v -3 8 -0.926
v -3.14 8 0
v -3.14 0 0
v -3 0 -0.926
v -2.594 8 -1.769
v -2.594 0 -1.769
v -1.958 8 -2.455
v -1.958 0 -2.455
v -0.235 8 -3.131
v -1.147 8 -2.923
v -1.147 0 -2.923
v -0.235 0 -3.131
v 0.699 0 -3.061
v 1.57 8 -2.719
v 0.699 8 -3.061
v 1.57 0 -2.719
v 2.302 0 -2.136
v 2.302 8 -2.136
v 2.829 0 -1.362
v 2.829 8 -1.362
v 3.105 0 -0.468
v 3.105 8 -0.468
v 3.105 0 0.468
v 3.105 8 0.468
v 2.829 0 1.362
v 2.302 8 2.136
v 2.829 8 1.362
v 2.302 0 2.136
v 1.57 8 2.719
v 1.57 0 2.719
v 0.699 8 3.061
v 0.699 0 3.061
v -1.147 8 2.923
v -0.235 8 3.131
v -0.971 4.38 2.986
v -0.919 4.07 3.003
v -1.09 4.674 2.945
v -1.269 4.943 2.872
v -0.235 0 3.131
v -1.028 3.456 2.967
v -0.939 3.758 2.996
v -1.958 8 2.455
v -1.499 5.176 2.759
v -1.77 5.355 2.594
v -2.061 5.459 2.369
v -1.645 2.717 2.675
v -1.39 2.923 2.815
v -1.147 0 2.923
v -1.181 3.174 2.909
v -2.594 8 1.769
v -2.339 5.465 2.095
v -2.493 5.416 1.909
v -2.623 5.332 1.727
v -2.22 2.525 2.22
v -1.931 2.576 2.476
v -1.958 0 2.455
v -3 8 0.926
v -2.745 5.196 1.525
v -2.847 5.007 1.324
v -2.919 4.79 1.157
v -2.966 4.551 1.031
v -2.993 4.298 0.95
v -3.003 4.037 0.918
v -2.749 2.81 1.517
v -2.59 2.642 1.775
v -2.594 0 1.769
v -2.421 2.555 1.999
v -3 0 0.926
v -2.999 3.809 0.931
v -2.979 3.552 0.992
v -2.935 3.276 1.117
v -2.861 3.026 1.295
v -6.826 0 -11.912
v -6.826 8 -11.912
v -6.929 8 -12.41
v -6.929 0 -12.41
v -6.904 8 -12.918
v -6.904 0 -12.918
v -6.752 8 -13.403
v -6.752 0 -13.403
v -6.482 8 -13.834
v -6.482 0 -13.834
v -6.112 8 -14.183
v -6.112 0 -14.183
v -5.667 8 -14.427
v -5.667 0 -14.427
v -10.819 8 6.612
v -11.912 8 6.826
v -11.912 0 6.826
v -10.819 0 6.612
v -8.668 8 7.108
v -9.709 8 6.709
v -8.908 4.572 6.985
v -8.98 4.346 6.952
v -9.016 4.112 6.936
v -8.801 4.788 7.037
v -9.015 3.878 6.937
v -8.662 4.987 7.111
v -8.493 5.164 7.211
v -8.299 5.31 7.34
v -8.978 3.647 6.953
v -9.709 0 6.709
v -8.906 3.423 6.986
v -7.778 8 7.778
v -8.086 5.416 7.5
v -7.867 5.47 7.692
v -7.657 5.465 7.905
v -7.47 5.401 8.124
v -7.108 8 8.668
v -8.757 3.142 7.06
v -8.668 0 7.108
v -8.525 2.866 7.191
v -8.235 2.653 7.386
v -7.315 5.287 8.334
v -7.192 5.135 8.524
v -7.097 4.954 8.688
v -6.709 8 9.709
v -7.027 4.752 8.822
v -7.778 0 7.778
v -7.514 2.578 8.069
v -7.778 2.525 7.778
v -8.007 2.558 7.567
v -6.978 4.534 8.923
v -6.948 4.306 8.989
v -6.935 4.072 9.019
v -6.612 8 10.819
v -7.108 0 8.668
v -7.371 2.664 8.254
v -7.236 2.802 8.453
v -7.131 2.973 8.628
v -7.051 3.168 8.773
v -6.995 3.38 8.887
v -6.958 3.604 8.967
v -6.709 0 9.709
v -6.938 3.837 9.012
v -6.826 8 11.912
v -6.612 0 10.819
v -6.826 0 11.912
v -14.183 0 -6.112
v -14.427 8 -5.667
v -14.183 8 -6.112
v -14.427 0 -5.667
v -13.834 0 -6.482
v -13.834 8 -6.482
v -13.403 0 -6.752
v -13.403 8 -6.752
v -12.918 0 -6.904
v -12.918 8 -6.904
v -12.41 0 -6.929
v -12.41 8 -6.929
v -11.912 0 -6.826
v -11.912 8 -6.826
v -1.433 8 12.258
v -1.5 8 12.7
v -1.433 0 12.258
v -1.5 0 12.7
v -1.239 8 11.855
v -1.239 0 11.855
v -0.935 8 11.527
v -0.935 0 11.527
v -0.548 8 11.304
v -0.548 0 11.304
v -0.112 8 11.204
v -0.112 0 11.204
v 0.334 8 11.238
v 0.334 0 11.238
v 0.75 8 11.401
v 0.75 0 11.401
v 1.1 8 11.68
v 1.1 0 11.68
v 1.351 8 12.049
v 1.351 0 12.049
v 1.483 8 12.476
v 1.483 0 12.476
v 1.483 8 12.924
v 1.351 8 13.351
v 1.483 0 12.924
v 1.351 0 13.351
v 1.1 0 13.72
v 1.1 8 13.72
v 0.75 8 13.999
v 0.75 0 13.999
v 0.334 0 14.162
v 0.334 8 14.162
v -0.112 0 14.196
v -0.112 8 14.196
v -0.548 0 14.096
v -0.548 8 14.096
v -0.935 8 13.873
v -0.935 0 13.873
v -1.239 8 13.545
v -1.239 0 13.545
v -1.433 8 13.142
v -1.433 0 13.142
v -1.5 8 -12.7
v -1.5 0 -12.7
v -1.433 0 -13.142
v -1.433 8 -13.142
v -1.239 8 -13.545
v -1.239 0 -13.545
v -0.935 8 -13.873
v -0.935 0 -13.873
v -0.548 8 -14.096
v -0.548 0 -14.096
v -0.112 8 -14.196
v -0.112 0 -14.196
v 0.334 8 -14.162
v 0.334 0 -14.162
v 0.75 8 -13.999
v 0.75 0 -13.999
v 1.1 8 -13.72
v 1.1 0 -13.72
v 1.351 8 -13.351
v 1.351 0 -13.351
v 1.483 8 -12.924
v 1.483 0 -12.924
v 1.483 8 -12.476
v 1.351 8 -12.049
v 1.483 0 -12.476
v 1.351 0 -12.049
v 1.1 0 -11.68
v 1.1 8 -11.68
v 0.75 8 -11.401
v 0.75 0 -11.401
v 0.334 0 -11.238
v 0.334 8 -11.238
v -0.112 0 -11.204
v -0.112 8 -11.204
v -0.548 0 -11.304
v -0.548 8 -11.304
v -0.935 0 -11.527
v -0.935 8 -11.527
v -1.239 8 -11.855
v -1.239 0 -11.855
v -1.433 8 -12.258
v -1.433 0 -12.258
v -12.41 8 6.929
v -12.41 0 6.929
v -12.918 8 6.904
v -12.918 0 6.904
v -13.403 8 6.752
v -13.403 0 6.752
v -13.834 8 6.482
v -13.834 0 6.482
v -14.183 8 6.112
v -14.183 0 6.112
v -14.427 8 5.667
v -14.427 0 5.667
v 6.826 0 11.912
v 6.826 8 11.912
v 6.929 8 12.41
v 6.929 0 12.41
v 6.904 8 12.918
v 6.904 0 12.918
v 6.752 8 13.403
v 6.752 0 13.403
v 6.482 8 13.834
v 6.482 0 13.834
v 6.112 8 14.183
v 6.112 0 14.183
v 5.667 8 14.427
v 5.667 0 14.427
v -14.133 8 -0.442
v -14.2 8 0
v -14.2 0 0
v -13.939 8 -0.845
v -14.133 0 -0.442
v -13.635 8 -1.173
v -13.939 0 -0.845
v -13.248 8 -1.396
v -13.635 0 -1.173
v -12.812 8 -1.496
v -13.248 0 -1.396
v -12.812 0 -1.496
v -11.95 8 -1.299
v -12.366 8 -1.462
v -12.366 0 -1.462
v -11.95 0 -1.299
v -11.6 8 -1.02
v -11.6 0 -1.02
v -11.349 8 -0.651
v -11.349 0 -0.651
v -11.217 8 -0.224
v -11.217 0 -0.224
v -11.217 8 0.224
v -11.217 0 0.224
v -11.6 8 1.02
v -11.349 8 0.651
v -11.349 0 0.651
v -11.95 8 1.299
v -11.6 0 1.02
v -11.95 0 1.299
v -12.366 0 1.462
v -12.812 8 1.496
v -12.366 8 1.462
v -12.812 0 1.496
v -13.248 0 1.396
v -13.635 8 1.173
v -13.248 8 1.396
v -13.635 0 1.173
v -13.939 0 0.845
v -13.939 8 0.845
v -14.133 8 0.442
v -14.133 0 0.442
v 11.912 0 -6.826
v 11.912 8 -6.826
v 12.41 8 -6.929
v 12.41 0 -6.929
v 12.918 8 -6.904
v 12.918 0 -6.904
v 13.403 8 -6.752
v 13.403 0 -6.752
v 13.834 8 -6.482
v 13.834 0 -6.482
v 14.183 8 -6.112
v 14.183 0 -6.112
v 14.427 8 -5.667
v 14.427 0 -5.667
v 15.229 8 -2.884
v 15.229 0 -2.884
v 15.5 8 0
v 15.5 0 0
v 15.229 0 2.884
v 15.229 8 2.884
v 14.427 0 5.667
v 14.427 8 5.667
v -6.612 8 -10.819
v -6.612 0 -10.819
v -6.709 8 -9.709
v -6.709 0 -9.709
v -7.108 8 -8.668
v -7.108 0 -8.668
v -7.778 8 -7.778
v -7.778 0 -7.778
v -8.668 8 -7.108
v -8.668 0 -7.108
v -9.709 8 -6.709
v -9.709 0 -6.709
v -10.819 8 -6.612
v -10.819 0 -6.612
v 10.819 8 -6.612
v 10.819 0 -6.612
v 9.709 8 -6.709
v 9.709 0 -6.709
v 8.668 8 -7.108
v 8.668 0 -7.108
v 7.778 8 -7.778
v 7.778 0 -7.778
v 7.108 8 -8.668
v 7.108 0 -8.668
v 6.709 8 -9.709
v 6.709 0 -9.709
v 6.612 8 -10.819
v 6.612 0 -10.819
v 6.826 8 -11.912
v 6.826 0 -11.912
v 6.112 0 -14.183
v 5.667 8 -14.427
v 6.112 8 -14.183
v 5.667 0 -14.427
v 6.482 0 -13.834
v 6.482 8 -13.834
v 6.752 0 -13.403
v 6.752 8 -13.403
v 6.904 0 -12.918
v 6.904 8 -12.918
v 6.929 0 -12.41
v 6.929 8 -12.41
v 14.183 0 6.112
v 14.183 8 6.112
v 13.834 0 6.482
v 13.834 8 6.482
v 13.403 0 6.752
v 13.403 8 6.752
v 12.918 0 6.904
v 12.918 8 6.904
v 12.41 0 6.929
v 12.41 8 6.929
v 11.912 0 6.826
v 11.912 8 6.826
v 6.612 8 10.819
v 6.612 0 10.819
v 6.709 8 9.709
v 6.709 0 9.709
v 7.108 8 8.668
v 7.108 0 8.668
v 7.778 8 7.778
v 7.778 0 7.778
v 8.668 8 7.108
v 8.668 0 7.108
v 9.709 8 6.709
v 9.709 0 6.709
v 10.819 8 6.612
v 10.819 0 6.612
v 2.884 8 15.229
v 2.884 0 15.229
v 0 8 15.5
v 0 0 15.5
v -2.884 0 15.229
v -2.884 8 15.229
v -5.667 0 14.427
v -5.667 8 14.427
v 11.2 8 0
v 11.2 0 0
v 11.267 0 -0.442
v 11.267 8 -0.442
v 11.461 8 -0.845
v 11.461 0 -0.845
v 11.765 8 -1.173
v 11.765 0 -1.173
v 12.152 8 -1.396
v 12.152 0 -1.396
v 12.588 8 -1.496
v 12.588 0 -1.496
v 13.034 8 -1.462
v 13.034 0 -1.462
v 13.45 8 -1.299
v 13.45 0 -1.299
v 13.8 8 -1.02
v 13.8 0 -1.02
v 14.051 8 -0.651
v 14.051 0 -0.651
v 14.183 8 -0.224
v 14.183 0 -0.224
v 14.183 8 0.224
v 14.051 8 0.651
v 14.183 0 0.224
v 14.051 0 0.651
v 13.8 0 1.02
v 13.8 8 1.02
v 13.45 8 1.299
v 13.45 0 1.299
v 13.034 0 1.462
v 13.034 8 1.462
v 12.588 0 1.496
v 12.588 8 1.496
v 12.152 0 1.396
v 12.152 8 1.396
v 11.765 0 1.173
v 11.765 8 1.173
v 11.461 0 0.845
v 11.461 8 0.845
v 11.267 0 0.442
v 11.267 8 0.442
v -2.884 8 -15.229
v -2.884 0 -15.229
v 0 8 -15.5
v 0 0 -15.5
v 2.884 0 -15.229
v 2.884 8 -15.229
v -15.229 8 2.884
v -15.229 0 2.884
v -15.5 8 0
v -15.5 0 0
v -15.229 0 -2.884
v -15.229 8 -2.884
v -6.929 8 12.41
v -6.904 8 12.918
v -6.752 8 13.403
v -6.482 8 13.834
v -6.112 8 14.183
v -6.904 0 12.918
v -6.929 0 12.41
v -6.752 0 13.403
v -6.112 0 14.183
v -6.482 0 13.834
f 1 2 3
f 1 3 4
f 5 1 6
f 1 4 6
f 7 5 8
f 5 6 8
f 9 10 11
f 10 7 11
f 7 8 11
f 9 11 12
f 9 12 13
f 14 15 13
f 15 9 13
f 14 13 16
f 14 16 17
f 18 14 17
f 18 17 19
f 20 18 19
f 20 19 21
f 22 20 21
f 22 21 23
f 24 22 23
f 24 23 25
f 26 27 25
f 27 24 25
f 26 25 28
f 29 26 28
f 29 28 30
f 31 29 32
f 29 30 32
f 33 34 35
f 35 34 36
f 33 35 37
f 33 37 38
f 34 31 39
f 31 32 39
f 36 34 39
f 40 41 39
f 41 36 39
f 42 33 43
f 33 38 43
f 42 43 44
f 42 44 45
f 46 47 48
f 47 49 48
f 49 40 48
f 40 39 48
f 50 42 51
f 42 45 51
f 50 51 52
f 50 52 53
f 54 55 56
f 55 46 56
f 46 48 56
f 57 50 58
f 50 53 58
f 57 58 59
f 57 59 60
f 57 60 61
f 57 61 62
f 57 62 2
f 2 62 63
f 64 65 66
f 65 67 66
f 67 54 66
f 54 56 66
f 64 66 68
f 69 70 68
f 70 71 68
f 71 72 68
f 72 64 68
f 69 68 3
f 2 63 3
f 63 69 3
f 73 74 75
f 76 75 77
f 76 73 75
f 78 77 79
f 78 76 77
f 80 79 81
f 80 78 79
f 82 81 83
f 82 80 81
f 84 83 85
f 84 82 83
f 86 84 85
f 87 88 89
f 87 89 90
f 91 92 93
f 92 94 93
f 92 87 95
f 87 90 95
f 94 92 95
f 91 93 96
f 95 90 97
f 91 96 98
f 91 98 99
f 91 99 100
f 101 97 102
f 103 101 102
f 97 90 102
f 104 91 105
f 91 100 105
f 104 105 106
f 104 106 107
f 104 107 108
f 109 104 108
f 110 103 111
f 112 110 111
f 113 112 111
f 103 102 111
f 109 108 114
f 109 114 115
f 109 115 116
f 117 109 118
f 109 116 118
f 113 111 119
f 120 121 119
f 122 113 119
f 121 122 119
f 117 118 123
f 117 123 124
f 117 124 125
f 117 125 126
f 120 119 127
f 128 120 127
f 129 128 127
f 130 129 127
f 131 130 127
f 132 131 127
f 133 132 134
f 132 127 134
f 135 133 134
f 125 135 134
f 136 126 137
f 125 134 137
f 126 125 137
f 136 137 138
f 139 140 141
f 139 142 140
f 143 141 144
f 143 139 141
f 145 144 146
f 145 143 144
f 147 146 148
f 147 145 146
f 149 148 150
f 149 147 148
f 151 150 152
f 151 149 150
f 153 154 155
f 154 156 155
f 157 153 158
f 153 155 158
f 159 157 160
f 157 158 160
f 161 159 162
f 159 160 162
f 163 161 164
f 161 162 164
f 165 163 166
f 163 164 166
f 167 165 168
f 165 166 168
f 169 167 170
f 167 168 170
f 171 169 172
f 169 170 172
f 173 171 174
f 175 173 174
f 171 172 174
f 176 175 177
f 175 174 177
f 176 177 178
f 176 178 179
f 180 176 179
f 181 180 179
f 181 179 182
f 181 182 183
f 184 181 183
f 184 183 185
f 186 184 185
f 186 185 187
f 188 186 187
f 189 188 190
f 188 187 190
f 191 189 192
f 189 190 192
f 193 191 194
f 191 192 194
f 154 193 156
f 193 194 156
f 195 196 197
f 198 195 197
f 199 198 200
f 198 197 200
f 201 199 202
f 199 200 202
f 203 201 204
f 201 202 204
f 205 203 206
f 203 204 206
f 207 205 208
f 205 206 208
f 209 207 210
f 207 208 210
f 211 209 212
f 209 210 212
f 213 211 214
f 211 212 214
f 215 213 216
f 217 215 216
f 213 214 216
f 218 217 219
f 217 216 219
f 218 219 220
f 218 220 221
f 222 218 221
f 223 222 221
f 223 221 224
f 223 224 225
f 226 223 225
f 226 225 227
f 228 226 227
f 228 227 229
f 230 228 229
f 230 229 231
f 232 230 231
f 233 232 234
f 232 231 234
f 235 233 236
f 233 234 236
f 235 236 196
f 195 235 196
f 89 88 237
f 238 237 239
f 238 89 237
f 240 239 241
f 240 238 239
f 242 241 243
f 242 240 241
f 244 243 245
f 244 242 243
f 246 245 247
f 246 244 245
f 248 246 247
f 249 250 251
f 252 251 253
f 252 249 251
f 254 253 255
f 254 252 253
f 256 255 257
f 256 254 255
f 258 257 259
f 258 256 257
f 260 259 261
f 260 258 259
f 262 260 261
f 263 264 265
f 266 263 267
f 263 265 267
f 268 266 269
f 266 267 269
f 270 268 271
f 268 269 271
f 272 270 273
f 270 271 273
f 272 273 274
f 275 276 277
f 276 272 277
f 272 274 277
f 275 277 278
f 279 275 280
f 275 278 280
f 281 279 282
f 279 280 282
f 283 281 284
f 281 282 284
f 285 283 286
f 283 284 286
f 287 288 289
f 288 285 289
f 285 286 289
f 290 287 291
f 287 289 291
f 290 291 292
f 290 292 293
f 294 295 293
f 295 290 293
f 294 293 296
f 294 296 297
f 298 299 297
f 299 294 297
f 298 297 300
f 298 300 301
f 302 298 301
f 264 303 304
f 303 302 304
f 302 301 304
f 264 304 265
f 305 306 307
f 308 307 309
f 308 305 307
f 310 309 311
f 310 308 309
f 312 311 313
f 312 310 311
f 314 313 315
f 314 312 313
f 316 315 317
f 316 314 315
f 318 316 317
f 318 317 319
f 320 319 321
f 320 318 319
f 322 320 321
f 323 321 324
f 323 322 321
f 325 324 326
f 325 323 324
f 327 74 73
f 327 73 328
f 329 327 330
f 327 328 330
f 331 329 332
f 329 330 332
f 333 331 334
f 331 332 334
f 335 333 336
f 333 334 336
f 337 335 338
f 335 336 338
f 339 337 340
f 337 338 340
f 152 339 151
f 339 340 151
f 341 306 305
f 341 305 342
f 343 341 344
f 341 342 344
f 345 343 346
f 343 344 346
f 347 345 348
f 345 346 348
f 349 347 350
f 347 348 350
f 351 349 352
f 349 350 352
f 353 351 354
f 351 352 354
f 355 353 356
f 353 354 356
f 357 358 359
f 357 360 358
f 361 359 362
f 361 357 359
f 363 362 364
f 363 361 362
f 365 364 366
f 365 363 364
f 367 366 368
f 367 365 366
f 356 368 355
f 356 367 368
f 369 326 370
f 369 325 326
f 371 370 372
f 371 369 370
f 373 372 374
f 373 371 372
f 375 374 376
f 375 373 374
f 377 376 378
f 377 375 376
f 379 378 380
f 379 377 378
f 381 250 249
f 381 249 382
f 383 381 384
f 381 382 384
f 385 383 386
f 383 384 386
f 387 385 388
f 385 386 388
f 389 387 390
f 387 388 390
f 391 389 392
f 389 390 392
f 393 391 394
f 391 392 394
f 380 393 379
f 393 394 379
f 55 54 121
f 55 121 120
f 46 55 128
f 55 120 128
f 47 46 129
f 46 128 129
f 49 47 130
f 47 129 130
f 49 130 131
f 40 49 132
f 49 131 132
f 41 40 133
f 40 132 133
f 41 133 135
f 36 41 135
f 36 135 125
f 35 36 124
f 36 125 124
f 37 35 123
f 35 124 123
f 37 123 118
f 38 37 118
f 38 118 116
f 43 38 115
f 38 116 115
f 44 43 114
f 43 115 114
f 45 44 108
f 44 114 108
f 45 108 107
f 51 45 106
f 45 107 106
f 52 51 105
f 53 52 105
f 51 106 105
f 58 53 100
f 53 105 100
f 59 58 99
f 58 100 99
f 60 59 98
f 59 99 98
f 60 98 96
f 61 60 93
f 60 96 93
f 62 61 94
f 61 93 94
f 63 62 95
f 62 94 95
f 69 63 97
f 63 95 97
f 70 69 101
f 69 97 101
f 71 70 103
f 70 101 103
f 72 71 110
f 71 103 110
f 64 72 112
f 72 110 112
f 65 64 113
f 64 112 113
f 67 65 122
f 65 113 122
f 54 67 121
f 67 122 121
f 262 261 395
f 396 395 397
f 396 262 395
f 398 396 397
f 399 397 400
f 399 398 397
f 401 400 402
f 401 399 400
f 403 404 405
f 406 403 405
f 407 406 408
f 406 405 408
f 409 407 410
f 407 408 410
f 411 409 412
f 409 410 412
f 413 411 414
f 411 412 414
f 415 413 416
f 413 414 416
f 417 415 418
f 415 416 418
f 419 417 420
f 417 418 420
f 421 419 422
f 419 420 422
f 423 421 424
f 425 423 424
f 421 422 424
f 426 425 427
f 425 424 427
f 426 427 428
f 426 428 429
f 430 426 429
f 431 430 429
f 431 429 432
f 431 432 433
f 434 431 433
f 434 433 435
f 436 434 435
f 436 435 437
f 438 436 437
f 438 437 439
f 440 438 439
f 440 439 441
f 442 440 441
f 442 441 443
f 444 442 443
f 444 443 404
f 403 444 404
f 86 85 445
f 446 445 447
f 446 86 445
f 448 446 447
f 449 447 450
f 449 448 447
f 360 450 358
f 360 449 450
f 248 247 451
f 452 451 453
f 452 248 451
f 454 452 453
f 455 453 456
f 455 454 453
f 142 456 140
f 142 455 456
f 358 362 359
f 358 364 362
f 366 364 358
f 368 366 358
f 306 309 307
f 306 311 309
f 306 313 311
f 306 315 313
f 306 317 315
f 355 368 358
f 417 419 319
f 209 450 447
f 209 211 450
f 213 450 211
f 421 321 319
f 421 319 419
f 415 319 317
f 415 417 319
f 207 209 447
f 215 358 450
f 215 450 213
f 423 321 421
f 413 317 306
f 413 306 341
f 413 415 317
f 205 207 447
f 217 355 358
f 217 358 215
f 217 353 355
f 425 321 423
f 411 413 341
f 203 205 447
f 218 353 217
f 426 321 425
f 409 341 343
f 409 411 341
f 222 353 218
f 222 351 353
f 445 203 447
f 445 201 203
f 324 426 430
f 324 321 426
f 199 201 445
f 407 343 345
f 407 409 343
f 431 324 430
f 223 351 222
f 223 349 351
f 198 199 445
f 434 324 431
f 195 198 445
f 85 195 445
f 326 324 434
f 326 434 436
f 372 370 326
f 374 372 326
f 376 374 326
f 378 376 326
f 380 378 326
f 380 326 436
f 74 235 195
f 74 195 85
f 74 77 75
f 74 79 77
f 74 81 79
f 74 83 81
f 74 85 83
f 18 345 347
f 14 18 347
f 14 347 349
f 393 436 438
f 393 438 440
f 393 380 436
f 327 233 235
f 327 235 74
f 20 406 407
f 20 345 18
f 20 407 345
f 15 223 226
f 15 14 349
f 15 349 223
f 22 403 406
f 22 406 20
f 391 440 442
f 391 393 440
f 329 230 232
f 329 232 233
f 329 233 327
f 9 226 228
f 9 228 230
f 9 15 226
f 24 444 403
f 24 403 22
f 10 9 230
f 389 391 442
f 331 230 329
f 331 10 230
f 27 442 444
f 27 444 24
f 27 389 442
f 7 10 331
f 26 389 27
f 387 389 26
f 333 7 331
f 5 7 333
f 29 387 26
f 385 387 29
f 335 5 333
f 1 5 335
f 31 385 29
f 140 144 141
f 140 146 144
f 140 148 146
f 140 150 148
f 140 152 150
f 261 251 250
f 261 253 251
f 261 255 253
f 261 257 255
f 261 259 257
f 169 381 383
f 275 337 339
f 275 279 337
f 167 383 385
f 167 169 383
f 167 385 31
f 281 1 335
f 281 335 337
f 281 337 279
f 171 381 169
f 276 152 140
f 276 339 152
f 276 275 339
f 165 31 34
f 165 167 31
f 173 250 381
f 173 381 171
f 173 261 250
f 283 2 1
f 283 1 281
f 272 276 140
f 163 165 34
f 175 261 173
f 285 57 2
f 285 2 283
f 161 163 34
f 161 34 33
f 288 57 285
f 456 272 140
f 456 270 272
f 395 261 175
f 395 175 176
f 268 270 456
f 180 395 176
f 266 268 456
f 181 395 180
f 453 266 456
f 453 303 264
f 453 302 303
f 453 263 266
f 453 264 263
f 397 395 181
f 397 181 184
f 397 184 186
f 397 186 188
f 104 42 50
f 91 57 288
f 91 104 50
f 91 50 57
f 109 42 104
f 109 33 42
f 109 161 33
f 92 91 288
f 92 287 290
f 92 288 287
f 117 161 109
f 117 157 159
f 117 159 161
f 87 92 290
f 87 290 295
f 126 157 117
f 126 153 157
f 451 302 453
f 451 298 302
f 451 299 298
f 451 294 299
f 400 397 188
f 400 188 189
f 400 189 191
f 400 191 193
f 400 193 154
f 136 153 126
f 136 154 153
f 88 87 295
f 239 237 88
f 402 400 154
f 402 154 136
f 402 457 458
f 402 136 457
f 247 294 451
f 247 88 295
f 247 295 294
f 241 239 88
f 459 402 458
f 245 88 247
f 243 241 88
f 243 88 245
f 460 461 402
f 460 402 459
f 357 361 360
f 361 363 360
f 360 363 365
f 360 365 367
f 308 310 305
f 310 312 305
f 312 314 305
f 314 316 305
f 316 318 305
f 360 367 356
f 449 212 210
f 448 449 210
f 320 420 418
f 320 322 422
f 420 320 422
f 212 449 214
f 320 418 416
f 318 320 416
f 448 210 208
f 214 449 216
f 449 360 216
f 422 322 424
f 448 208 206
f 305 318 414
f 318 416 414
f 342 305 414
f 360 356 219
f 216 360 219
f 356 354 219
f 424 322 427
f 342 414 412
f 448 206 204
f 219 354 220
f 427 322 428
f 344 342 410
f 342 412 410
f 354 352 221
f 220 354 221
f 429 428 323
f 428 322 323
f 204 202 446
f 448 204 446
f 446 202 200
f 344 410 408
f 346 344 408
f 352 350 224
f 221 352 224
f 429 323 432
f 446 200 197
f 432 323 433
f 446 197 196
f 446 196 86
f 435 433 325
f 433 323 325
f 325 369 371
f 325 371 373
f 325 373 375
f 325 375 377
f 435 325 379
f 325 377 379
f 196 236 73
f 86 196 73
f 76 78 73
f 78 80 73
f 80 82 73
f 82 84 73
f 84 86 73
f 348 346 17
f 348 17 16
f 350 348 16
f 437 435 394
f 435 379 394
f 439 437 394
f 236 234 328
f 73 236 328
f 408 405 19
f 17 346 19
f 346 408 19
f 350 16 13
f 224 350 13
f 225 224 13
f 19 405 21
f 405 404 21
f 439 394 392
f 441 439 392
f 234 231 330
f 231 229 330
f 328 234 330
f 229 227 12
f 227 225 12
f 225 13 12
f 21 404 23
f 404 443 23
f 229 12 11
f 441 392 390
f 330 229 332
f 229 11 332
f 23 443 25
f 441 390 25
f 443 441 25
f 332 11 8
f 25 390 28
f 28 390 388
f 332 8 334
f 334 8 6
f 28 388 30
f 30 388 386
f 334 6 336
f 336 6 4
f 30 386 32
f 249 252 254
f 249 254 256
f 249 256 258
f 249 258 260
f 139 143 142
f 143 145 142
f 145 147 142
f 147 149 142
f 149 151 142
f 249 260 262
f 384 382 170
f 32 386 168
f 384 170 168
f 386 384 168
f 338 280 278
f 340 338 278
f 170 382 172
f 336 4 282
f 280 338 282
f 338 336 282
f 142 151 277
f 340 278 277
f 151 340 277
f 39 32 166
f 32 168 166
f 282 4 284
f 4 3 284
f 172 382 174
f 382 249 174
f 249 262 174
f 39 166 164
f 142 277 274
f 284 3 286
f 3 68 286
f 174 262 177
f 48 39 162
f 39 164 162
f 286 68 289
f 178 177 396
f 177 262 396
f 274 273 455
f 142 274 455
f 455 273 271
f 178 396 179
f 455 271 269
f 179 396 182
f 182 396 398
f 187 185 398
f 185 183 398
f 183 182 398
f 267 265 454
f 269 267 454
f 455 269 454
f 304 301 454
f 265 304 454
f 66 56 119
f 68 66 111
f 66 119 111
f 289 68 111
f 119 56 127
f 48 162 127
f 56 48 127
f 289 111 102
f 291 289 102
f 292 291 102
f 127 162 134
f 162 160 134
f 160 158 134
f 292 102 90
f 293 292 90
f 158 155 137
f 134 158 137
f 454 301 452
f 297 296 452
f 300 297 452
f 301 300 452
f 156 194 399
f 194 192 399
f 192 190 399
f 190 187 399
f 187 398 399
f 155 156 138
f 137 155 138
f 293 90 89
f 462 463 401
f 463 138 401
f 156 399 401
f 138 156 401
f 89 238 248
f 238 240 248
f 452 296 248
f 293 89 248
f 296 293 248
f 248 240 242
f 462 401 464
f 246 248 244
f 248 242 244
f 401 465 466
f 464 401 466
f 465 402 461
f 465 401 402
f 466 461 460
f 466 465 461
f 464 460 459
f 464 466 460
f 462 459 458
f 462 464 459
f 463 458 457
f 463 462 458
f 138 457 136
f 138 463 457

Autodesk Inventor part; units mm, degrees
ref_plane "XZ Plane" through (0, 0, 0) normal (0, 1, 0) x (-1, 0, 0)
sketch "Skizze1" plane through (0, 0, 0) normal (0, 1, 0) x (-1, 0, 0)
  circle A0 centre (0, 0) radius 3.14
  circle A1 centre (0, 0) radius 12.7
  circle A2 centre (0, 0) radius 15.5
  circle A3 centre (0, 12.7) radius 1.5
  circle A4 centre (12.7, 0) radius 1.5
  circle A5 centre (0, -12.7) radius 1.5
  circle A6 centre (-12.7, 0) radius 1.5
  dimension "d0" = 6.28
  dimension "d1" = 25.4
  dimension "d2" = 31
  dimension "d3" = 3
  dimension "d4" = 3
  dimension "d5" = 3
  dimension "d6" = 3
extrude "Extrusion1" add sketch "Skizze1" along normal blind 8 contours A4 A1 A5 A6 A3 | A2
ref_plane "Arbeitsebene3" through (-10.9602, 0, 10.9602) normal (-0.7071, 0, 0.7071) x (0, -1, 0)
ref_plane "Arbeitsebene2" through (0, 0, 0) normal (-0.7071, 0, 0.7071) x (0, -1, 0)
sketch "Skizze2" plane through (-10.9602, 0, 10.9602) normal (-0.7071, 0, 0.7071) x (0, -1, 0)
  circle A0 centre (-4, 0) radius 1.475
  line L0 (0, 15.5) -> (0, -15.5) projected
  point P0 (0, 0)
  dimension "d9" = 2.95
  dimension "d10" = 4
extrude "Extrusion2" cut sketch "Skizze2" against normal blind 16
sketch "Skizze3" plane through (0, 0, 0) normal (0, -1, 0) x (1, 0, 0)
  circle A0 centre (0, 0) radius 15.5 projected
  arc A1 (-11.9125, 6.8258) -> (-6.8258, 11.9125) centre (-10.6066, 10.6066) ccw
  line L0 (0, 0) -> (-15.0003, 15.0003) construction
  line L1 (0, 0) -> (0, 6.573) construction
  arc A2 (-14.4271, 5.6666) -> (-5.6666, 14.4271) centre (0, 0) ccw
  arc A3 (-11.9125, 6.8258) -> (-14.4271, 5.6666) centre (-12.5655, 4.9354) ccw
  arc A4 (-5.6666, 14.4271) -> (-6.8258, 11.9125) centre (-4.9354, 12.5655) ccw
  point P0 (-5.6666, 14.4271)
  point P1 (-14.4271, 5.6666)
  dimension "d13" = 8
  dimension "d14" = 45
  dimension "d15" = 2
  dimension "d18" = 15
extrude "Extrusion3" cut sketch "Skizze3" against normal blind 16 contours A4 A1 A3 A0 picked at (-11.6232, 8.691)
pattern_circular "Runde Anordnung1" count 4 over 360 about axis through (0, 0, 0) along (0, 1, 0) of "Extrusion3"
properties part number "lüfter_flansch"
